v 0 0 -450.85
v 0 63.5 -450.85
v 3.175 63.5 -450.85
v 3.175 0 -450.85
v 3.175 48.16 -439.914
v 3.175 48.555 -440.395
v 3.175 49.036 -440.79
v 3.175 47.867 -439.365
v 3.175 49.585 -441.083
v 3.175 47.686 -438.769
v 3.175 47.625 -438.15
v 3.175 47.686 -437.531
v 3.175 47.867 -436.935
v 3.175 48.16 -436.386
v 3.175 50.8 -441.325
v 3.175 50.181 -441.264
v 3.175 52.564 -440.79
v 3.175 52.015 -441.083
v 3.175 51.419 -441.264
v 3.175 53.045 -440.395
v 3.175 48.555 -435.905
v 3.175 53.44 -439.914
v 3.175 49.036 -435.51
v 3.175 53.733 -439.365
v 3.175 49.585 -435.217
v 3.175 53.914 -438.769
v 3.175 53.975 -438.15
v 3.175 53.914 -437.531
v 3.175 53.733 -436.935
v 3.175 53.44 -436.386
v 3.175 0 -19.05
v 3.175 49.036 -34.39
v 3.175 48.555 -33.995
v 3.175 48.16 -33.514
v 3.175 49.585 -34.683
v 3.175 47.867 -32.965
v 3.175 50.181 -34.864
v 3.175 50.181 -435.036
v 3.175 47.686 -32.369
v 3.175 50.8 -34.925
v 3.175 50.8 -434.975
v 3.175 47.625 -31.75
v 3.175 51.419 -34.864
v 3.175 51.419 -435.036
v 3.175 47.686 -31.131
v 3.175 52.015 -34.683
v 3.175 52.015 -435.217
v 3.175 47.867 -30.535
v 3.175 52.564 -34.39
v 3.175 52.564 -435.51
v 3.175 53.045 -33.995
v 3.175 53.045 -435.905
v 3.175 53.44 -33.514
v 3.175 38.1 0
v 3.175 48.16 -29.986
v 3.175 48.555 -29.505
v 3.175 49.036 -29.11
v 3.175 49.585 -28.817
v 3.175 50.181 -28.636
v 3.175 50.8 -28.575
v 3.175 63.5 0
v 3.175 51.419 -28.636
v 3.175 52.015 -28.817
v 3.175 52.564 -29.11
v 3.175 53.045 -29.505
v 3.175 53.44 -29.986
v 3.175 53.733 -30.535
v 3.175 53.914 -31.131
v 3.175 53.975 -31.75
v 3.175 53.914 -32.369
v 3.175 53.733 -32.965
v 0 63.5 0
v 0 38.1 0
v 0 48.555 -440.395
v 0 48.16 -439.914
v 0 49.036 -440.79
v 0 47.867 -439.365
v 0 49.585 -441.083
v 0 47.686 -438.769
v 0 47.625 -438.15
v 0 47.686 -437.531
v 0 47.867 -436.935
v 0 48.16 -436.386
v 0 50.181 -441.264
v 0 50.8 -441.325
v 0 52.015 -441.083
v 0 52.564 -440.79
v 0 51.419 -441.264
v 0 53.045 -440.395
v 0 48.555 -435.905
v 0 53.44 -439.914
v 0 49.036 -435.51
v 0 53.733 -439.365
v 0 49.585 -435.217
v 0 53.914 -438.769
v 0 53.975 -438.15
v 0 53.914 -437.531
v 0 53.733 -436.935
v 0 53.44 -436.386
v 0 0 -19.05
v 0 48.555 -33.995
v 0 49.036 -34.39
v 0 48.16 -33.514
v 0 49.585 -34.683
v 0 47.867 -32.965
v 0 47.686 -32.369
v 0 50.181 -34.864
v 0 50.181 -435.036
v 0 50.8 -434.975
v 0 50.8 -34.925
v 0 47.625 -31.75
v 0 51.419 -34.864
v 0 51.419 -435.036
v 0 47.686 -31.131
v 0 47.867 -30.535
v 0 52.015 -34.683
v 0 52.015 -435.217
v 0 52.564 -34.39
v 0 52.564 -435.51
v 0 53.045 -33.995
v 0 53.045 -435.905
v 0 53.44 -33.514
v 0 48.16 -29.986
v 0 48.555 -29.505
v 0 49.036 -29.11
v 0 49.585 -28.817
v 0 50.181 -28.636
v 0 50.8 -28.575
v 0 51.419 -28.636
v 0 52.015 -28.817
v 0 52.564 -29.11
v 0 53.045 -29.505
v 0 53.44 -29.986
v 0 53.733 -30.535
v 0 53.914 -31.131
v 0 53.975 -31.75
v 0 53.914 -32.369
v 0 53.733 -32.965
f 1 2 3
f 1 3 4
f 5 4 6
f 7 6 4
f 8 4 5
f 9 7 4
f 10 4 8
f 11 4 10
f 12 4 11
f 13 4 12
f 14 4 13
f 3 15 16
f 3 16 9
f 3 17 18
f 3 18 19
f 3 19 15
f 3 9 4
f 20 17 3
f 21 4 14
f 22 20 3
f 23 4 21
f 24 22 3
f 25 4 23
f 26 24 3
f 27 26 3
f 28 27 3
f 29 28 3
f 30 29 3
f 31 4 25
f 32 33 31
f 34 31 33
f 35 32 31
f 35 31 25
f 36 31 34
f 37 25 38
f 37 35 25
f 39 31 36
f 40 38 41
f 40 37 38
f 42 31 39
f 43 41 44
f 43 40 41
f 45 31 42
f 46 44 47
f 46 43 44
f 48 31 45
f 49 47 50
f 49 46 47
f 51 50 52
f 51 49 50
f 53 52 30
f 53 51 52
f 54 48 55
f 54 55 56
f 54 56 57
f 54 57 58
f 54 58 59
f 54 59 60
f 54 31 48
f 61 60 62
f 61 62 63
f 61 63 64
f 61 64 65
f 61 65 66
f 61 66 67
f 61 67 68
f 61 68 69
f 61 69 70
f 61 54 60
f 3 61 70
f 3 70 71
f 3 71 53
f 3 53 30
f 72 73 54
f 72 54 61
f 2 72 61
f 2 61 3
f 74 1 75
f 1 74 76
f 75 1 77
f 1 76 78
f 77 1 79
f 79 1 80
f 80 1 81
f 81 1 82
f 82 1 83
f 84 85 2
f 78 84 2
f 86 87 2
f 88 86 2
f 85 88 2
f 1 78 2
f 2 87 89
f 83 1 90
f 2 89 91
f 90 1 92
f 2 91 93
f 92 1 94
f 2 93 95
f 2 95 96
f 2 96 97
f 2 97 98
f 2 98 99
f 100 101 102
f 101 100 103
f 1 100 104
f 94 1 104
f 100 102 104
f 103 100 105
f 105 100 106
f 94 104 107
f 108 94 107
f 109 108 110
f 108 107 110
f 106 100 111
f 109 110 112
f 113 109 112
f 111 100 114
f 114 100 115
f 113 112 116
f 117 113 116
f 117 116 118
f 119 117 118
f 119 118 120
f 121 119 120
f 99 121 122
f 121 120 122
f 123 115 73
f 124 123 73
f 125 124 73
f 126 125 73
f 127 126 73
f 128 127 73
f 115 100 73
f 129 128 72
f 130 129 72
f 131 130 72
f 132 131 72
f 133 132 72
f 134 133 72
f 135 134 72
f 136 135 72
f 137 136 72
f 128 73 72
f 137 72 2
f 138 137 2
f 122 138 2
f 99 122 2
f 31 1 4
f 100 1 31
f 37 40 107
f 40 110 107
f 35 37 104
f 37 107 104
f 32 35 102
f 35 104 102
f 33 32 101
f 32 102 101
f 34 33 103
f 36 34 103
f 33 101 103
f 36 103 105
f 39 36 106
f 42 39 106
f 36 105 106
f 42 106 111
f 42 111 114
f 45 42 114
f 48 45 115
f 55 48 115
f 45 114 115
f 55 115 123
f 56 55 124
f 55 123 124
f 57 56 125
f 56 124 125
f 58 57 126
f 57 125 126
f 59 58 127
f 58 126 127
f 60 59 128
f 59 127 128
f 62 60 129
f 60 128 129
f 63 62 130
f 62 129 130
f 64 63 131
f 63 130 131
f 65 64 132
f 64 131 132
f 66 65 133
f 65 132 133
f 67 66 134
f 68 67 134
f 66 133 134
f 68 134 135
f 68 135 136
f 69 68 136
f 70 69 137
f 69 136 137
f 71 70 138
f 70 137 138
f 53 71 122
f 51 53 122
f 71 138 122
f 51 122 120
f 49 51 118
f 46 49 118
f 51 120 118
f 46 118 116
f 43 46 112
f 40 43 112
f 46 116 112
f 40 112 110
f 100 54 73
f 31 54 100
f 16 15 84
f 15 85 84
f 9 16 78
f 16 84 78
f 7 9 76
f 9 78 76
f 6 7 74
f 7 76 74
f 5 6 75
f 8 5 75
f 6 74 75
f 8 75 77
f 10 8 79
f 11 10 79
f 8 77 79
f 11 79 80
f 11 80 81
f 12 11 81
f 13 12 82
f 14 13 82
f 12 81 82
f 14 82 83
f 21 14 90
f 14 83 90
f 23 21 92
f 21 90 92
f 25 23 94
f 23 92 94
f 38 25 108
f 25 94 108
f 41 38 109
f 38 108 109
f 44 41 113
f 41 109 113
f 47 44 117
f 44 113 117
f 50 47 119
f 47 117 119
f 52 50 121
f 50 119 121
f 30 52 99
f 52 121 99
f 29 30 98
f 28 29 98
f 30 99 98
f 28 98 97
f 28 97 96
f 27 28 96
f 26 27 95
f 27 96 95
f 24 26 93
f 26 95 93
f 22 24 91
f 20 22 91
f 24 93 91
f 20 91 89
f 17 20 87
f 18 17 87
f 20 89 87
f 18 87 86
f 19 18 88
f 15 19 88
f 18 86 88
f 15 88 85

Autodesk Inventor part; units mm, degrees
ref_plane "YZ Plane" through (0, 0, 0) normal (1, 0, 0) x (0, 1, 0)
ref_plane "XZ Plane" through (0, 0, 0) normal (0, 1, 0) x (-1, 0, 0)
ref_plane "XY Plane" through (0, 0, 0) normal (0, 0, 1) x (1, 0, 0)
sketch "Sketch1" plane through (0, 0, 0) normal (1, 0, 0) x (0, 1, 0)
  line L0 (0, 0) -> (63.5, 0)
  line L1 (63.5, 0) -> (63.5, -450.85)
  line L2 (63.5, -450.85) -> (0, -450.85)
  line L3 (0, -450.85) -> (0, 0)
  dimension "d0" = 63.5
  dimension "d1" = 450.85
extrude "Extrusion1" add sketch "Sketch1" along normal blind 3.175
sketch "Sketch2" plane through (3.175, 0, 0) normal (1, 0, 0) x (0, 0, -1)
  line L0 (0, 63.5) -> (0, 0) projected
  line L1 (0, 0) -> (450.85, 0) projected
  line L2 (450.85, 0) -> (450.85, 63.5) projected
  line L3 (450.85, 63.5) -> (0, 63.5) projected
  point P0 (31.75, 50.8)
  point P1 (438.15, 50.8)
  dimension "d4" = 31.75
  dimension "d5" = 12.7
  dimension "d6" = 12.7
  dimension "d7" = 12.7
hole "Hole1" at (3.175, 50.8, -31.75) at (3.175, 50.8, -438.15) direction (-1, 0, 0) diameter 6.35 end through all
sketch "Sketch3" plane through (3.175, 0, 0) normal (1, 0, 0) x (0, 0, -1)
  circle A0 centre (31.75, 50.8) radius 3.175 projected
  circle A1 centre (438.15, 50.8) radius 3.175 projected
  line L0 (0, 63.5) -> (0, 0) projected
  line L1 (0, 0) -> (450.85, 0) projected
  line L2 (450.85, 0) -> (450.85, 63.5) projected
  line L3 (450.85, 63.5) -> (0, 63.5) projected
  line L4 (0, 0) -> (0, 38.1)
  line L5 (0, 0) -> (19.05, 0)
  line L6 (0, 0) -> (450.85, 0) projected
  line L7 (0, 38.1) -> (19.05, 0)
  dimension "d15" = 38.1
  dimension "d16" = 19.05
extrude "Extrusion2" cut sketch "Sketch3" against normal blind 3.175 contours L7 L1 L0
properties part number "chain guard"
